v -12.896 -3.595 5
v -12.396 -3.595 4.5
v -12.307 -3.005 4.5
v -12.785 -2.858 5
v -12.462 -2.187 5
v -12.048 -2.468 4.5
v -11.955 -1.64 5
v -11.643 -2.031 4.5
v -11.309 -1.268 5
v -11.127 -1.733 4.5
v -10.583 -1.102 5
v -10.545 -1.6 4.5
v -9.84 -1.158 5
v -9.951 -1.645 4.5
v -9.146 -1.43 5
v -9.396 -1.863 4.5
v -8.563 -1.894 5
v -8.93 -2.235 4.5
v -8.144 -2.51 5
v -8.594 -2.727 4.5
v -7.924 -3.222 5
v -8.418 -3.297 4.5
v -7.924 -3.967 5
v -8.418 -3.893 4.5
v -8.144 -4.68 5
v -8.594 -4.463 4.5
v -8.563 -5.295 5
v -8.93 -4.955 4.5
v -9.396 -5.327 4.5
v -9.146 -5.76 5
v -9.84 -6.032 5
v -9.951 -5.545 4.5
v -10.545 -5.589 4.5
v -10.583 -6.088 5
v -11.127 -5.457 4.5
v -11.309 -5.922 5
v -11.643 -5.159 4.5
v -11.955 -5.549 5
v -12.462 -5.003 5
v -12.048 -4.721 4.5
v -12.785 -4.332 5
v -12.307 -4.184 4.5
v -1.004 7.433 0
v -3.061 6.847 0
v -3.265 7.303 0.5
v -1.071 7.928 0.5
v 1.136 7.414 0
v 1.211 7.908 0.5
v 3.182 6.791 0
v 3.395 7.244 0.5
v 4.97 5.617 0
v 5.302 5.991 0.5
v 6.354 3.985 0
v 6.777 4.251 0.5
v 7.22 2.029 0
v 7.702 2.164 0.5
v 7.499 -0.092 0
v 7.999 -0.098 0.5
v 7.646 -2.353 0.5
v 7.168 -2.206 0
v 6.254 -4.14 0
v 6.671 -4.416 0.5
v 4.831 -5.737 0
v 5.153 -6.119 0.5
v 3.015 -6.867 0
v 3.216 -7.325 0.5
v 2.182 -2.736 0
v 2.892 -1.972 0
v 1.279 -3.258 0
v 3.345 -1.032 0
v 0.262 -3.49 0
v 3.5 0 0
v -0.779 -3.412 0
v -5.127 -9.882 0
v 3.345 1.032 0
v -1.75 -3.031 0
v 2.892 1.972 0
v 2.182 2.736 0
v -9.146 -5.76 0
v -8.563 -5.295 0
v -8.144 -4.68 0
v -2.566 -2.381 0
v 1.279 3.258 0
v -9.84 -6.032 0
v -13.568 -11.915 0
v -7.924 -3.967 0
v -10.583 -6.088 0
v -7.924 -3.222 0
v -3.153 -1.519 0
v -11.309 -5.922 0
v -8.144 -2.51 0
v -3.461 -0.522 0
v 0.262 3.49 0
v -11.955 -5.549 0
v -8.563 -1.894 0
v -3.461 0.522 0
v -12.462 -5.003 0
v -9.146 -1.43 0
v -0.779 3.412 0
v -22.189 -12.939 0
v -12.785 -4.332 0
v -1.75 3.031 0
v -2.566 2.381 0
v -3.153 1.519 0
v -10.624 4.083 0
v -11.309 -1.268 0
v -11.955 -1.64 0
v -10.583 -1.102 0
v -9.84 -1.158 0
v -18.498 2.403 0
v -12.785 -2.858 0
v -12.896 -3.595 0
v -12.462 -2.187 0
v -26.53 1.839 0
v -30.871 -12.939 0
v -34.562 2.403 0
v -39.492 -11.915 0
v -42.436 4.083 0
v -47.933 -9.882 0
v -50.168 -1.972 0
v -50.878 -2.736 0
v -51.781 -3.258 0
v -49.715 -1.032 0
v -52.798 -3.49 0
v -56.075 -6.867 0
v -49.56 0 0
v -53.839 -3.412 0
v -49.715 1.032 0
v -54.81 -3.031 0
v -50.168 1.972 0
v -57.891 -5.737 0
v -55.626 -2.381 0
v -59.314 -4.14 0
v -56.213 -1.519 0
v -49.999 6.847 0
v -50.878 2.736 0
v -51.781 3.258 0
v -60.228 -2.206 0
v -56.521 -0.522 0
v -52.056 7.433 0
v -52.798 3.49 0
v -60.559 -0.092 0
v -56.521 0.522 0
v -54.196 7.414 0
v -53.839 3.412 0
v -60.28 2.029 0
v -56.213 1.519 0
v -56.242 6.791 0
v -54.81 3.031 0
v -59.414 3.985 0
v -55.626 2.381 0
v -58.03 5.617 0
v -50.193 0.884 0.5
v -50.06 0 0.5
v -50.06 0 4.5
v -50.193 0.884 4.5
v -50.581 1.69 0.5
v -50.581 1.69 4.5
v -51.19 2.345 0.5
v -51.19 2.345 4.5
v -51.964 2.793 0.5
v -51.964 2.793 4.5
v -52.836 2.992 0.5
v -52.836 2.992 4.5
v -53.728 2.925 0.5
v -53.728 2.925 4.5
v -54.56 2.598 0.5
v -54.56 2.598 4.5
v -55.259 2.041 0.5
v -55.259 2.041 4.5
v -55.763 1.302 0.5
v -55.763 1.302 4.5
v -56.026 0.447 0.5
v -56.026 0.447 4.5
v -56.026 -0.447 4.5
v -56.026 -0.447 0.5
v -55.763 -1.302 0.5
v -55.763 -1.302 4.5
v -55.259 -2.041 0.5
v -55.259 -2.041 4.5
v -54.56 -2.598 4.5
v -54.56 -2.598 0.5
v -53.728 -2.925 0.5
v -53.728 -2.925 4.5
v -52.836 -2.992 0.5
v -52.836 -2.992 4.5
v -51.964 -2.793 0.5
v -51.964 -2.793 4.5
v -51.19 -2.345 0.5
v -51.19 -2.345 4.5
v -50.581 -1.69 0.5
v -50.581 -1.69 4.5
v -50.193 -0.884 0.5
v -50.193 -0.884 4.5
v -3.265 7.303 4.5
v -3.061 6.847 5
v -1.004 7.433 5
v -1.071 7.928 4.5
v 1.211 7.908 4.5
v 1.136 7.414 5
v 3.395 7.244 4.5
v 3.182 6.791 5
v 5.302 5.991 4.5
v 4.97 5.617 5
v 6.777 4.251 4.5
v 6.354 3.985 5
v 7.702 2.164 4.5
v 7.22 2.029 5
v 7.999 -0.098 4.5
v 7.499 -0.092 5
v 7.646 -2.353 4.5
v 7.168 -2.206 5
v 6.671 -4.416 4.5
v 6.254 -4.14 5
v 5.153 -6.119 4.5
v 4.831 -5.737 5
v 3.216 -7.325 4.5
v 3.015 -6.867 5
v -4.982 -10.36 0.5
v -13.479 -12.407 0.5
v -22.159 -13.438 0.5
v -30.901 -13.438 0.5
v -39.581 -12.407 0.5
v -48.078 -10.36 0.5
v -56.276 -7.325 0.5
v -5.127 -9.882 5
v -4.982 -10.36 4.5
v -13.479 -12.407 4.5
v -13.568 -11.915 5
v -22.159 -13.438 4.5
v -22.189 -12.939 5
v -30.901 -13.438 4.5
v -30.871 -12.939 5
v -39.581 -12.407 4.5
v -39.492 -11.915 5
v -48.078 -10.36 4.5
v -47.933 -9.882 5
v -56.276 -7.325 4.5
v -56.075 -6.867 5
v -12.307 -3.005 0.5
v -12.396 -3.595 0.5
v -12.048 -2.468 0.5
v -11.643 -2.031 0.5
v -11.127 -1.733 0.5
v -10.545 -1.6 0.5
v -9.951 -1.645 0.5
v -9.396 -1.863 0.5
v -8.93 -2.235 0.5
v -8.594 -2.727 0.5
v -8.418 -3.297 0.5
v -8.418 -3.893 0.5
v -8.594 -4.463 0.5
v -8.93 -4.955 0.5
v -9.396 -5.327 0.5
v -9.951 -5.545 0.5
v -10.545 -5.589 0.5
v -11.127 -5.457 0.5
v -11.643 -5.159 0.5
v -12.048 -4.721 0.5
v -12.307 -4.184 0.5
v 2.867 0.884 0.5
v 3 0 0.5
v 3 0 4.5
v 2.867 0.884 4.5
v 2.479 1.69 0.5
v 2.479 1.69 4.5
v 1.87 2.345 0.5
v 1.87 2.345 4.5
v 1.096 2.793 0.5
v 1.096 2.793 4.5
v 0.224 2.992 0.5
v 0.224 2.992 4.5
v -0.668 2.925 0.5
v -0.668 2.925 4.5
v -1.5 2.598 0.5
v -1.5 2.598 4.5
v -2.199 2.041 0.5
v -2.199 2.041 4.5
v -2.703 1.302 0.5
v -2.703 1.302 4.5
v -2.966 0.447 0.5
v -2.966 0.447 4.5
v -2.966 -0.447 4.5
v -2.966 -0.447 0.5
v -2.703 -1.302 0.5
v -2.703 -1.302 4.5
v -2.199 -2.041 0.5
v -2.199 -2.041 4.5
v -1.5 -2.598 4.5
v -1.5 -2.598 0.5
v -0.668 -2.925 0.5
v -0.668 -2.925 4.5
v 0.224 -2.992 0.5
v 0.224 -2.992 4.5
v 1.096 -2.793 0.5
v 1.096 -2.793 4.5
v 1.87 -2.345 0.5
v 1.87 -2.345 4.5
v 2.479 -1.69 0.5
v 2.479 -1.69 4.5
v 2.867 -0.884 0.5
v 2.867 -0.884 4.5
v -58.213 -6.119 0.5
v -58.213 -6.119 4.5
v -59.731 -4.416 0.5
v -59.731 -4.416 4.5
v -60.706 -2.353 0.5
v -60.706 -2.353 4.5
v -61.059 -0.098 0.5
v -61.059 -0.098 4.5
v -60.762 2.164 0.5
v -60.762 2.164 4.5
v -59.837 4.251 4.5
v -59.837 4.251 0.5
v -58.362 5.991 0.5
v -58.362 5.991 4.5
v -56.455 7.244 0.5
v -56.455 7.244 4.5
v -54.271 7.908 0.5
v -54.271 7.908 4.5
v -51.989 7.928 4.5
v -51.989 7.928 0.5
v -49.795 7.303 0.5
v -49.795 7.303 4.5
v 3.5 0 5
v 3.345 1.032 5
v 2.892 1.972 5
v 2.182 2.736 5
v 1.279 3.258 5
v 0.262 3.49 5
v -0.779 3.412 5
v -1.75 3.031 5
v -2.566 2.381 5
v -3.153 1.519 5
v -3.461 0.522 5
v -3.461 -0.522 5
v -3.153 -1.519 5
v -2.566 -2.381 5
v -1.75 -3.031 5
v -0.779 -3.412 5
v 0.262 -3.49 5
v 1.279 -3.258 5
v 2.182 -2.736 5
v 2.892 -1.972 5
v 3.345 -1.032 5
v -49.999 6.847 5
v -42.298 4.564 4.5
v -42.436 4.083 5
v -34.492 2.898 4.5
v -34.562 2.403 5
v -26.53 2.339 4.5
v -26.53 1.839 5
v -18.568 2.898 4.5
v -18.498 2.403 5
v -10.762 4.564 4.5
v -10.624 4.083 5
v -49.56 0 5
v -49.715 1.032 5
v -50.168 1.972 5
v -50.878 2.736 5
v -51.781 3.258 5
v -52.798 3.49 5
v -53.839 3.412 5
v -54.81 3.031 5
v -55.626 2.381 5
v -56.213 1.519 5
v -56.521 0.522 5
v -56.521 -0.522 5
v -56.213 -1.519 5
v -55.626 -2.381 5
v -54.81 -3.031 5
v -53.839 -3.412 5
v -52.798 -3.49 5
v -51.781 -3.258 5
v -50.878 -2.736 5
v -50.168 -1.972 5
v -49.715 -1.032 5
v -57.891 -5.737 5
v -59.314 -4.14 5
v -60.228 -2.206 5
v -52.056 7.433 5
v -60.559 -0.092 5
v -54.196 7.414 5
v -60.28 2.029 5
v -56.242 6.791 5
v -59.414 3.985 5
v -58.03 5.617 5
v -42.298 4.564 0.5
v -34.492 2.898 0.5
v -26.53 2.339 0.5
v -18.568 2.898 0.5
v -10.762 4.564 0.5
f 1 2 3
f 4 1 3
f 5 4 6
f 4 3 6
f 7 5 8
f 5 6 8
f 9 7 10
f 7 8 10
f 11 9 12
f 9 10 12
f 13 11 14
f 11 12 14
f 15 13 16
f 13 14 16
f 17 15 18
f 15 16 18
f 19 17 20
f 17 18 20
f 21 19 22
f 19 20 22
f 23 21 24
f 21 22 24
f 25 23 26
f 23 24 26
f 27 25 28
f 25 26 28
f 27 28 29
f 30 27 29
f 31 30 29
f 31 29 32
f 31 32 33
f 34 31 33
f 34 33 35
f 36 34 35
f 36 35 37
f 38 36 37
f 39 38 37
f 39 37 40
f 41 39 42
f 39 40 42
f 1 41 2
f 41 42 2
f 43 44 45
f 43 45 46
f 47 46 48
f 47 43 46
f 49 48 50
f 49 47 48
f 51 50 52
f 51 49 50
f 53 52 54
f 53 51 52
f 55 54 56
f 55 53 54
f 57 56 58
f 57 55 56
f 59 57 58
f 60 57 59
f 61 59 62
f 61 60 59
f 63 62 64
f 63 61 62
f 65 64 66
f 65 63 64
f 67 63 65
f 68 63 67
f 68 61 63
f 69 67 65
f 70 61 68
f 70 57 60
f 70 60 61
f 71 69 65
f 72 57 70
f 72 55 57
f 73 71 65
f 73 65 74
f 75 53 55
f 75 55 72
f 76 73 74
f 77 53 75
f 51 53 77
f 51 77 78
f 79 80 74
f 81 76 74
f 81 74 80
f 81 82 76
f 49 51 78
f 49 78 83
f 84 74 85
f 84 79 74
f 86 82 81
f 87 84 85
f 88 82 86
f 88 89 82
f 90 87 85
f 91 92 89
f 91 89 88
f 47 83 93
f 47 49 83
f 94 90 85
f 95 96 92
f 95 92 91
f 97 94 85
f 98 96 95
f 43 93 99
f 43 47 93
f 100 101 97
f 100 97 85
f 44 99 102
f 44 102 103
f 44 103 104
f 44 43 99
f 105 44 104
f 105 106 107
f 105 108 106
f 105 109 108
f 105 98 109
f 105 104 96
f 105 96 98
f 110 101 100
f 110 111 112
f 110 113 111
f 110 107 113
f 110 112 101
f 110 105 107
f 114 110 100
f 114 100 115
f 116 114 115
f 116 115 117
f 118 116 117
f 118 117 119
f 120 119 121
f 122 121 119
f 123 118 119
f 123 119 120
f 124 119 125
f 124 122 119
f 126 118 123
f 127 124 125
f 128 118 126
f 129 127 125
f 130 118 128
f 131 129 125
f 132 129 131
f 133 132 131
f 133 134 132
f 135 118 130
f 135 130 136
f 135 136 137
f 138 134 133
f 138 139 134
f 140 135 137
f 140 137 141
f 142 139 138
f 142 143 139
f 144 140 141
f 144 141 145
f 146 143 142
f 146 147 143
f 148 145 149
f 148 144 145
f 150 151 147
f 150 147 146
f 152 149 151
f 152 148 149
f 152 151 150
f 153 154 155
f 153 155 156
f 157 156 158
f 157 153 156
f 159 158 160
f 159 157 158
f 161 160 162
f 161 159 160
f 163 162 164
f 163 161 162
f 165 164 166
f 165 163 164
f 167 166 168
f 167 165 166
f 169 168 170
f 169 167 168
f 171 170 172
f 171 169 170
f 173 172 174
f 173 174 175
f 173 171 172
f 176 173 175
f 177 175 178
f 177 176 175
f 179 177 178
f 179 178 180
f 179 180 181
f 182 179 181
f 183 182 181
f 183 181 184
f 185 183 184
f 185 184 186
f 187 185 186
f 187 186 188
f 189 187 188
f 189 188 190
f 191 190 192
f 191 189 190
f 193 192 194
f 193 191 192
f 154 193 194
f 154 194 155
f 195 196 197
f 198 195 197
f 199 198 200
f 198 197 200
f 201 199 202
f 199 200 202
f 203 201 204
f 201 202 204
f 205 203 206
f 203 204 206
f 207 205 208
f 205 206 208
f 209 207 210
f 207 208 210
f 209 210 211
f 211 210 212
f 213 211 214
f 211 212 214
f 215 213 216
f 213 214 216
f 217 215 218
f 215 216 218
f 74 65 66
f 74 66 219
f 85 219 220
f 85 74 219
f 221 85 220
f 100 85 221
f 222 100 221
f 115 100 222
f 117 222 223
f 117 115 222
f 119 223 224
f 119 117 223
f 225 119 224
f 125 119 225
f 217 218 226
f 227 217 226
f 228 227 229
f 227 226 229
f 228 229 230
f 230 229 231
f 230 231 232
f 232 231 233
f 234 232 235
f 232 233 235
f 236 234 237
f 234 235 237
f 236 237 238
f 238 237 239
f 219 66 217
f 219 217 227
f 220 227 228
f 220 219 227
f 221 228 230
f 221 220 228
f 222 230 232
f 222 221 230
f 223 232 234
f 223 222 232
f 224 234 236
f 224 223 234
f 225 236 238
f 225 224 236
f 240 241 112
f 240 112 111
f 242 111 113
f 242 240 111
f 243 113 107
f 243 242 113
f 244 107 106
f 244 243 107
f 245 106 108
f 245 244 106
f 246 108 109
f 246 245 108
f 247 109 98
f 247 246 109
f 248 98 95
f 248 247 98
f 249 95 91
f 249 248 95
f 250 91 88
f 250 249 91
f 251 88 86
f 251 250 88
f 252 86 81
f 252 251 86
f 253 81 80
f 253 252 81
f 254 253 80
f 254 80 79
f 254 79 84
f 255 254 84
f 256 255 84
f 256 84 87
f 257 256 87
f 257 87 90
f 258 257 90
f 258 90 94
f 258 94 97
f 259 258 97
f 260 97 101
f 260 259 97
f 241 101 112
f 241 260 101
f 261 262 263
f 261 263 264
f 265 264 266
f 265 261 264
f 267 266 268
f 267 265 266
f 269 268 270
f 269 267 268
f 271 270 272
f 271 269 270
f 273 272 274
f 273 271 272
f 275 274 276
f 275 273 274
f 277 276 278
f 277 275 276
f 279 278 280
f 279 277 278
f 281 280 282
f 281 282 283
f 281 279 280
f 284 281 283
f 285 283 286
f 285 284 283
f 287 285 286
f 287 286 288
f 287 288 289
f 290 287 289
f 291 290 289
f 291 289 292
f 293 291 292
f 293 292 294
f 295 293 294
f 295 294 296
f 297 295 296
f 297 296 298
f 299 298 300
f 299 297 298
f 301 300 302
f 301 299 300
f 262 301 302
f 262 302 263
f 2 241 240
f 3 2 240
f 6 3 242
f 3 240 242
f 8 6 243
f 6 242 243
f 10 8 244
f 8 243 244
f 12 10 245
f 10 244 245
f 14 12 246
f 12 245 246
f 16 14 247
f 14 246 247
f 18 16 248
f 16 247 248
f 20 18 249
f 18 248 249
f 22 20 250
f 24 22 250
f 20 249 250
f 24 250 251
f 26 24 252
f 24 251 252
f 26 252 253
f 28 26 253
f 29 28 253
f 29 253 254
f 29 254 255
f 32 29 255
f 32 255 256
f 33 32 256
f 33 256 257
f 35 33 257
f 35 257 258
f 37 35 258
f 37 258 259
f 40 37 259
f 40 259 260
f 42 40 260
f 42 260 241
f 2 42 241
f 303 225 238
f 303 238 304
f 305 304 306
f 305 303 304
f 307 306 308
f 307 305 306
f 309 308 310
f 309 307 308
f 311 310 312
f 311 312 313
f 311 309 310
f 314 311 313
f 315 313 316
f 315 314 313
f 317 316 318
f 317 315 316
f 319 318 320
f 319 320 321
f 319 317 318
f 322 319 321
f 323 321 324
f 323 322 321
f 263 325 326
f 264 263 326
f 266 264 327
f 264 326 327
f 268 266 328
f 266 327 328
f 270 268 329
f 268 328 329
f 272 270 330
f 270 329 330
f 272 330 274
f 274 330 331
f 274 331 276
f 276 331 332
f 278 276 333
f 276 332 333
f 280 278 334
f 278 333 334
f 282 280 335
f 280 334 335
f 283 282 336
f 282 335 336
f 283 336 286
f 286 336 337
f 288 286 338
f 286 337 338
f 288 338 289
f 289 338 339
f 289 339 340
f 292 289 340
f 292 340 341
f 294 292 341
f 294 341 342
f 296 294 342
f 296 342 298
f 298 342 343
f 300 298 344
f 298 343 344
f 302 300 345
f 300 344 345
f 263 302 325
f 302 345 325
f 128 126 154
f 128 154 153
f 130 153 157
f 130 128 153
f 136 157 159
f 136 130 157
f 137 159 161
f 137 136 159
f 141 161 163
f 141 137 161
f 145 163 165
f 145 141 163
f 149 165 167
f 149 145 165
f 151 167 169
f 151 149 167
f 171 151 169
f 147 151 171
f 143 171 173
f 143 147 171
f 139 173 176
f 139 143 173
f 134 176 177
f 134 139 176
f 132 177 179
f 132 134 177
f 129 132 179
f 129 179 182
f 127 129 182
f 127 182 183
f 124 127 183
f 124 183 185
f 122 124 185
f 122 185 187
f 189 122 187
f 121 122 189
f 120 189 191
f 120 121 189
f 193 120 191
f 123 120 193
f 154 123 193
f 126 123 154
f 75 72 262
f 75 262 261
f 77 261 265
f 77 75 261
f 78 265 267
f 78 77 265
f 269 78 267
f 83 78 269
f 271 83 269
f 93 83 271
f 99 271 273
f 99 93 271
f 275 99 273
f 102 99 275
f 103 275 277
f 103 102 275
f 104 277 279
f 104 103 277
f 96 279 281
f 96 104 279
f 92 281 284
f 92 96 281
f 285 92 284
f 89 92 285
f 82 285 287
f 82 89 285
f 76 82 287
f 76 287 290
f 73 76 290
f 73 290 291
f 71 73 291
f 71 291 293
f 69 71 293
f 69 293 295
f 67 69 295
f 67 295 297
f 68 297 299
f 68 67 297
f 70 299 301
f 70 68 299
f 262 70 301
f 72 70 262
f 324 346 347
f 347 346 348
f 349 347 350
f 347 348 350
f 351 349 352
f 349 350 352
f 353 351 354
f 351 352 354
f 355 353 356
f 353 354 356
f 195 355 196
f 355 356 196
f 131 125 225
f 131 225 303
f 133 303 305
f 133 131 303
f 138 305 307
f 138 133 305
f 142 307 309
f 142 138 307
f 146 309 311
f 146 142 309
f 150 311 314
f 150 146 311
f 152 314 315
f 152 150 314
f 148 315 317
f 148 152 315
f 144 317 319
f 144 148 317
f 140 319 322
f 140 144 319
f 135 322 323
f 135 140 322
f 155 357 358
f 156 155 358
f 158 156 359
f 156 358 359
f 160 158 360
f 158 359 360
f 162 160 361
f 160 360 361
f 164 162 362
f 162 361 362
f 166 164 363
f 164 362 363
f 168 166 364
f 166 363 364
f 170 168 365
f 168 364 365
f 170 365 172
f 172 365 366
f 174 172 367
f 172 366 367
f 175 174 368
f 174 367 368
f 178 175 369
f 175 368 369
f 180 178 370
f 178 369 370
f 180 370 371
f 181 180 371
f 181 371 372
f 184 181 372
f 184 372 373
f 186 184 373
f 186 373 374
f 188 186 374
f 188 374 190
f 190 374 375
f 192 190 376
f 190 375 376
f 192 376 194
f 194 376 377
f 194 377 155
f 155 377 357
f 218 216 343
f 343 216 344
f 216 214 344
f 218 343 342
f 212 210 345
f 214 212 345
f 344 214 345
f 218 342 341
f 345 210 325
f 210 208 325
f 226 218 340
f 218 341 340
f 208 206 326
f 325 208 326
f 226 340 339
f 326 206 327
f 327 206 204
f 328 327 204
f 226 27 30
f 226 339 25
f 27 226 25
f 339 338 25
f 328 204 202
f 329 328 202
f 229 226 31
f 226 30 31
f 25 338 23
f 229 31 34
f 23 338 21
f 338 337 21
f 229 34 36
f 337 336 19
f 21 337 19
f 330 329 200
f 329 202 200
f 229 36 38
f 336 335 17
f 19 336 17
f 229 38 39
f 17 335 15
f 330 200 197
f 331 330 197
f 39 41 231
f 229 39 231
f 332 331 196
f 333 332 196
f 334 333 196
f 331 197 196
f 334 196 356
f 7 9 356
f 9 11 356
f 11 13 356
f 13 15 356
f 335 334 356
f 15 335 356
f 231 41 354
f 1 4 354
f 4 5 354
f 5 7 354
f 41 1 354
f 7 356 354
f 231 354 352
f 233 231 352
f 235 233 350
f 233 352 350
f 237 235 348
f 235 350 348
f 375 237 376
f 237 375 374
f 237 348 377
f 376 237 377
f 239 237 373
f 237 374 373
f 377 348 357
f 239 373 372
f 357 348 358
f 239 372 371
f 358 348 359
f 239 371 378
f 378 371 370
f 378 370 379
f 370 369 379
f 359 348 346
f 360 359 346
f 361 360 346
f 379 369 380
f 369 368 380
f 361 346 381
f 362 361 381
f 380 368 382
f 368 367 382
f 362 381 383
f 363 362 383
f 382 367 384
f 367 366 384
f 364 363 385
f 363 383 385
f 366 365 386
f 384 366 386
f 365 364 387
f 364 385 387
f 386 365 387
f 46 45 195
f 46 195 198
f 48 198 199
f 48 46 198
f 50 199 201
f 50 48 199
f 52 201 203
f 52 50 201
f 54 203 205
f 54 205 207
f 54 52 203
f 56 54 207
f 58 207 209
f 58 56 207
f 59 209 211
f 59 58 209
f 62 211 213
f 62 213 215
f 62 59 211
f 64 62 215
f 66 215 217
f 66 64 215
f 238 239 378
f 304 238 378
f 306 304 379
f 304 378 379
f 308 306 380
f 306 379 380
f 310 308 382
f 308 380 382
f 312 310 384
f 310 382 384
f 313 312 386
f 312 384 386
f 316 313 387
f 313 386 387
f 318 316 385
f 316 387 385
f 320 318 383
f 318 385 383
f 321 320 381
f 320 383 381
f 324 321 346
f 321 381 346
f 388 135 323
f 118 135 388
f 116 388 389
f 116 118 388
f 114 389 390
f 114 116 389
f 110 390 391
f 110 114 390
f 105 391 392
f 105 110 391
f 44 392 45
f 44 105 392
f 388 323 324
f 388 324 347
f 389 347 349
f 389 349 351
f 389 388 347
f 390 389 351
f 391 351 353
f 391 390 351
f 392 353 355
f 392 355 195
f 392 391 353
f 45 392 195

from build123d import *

# Parameters (mm, degrees)
SKETCH_1_R               = 3
EXTRUDE_1_DEPTH          = 5
CHAMFER_1_SIZE           = 0.5
SKETCH_2_R               = 2
CUT_EXTRUDE_1_DEPTH      = 1
CUT_EXTRUDE_1_DEPTH_BACK = 6
CHAMFER_2_SIZE           = 0.5


with BuildPart() as part:
    # 草图1 → 凸台-拉伸1 (new body)
    with BuildSketch(Plane.XY):
        with BuildLine():
            ThreePointArc((-56.275757576, -7.325223765), (-60.374306352, 3.240512704), (-49.794769231, 7.303305281))
            ThreePointArc((-49.794769231, 7.303305281), (-26.53, 2.339355406), (-3.265230769, 7.303305281))
            ThreePointArc((-3.265230769, 7.303305281), (7.314306352, 3.240512704), (3.215757576, -7.325223765))
            ThreePointArc((3.215757576, -7.325223765), (-26.53, -13.566903935), (-56.275757576, -7.325223765))
        make_face()
        Circle(SKETCH_1_R, mode=Mode.SUBTRACT)
        with Locations((-53.06, 0)):
            Circle(SKETCH_1_R, mode=Mode.SUBTRACT)
    extrude(amount=EXTRUDE_1_DEPTH)

    # 倒角1
    chamfer_1_edges = [part.edges().sort_by_distance(p)[0] for p in [
        (-3, 0, 0),
        (-3, 0, 5),
        (-26.53, 2.339355406, 5),
        (-56.06, 0, 0),
        (-56.06, 0, 5),
        (-60.374306352, 3.240512704, 5),
        (-26.53, -13.566903935, 5),
        (-60.374306352, 3.240512704, 0),
        (-26.53, 2.339355406, 0),
        (7.314306352, 3.240512704, 0),
        (-26.53, -13.566903935, 0),
        (7.314306352, 3.240512704, 5),
    ]]
    chamfer(chamfer_1_edges, length=CHAMFER_1_SIZE)

    # 草图2 → 切除-拉伸1 (cut, two sides)
    with BuildSketch(Plane(origin=(0, 0, 0), x_dir=(-1, 0, 0), z_dir=(0, 0, -1))) as cut_extrude_1_sk:
        with Locations((10.396009946, -3.594854266)):
            Circle(SKETCH_2_R)
    extrude(amount=CUT_EXTRUDE_1_DEPTH, mode=Mode.SUBTRACT)
    extrude(cut_extrude_1_sk.sketch, amount=-CUT_EXTRUDE_1_DEPTH_BACK, mode=Mode.SUBTRACT)

    # 倒角2
    chamfer_2_edges = [part.edges().sort_by_distance(p)[0] for p in [
        (-8.396009946, -3.594854266, 5),
        (-8.396009946, -3.594854266, 0),
    ]]
    chamfer(chamfer_2_edges, length=CHAMFER_2_SIZE)


solid = part.part
